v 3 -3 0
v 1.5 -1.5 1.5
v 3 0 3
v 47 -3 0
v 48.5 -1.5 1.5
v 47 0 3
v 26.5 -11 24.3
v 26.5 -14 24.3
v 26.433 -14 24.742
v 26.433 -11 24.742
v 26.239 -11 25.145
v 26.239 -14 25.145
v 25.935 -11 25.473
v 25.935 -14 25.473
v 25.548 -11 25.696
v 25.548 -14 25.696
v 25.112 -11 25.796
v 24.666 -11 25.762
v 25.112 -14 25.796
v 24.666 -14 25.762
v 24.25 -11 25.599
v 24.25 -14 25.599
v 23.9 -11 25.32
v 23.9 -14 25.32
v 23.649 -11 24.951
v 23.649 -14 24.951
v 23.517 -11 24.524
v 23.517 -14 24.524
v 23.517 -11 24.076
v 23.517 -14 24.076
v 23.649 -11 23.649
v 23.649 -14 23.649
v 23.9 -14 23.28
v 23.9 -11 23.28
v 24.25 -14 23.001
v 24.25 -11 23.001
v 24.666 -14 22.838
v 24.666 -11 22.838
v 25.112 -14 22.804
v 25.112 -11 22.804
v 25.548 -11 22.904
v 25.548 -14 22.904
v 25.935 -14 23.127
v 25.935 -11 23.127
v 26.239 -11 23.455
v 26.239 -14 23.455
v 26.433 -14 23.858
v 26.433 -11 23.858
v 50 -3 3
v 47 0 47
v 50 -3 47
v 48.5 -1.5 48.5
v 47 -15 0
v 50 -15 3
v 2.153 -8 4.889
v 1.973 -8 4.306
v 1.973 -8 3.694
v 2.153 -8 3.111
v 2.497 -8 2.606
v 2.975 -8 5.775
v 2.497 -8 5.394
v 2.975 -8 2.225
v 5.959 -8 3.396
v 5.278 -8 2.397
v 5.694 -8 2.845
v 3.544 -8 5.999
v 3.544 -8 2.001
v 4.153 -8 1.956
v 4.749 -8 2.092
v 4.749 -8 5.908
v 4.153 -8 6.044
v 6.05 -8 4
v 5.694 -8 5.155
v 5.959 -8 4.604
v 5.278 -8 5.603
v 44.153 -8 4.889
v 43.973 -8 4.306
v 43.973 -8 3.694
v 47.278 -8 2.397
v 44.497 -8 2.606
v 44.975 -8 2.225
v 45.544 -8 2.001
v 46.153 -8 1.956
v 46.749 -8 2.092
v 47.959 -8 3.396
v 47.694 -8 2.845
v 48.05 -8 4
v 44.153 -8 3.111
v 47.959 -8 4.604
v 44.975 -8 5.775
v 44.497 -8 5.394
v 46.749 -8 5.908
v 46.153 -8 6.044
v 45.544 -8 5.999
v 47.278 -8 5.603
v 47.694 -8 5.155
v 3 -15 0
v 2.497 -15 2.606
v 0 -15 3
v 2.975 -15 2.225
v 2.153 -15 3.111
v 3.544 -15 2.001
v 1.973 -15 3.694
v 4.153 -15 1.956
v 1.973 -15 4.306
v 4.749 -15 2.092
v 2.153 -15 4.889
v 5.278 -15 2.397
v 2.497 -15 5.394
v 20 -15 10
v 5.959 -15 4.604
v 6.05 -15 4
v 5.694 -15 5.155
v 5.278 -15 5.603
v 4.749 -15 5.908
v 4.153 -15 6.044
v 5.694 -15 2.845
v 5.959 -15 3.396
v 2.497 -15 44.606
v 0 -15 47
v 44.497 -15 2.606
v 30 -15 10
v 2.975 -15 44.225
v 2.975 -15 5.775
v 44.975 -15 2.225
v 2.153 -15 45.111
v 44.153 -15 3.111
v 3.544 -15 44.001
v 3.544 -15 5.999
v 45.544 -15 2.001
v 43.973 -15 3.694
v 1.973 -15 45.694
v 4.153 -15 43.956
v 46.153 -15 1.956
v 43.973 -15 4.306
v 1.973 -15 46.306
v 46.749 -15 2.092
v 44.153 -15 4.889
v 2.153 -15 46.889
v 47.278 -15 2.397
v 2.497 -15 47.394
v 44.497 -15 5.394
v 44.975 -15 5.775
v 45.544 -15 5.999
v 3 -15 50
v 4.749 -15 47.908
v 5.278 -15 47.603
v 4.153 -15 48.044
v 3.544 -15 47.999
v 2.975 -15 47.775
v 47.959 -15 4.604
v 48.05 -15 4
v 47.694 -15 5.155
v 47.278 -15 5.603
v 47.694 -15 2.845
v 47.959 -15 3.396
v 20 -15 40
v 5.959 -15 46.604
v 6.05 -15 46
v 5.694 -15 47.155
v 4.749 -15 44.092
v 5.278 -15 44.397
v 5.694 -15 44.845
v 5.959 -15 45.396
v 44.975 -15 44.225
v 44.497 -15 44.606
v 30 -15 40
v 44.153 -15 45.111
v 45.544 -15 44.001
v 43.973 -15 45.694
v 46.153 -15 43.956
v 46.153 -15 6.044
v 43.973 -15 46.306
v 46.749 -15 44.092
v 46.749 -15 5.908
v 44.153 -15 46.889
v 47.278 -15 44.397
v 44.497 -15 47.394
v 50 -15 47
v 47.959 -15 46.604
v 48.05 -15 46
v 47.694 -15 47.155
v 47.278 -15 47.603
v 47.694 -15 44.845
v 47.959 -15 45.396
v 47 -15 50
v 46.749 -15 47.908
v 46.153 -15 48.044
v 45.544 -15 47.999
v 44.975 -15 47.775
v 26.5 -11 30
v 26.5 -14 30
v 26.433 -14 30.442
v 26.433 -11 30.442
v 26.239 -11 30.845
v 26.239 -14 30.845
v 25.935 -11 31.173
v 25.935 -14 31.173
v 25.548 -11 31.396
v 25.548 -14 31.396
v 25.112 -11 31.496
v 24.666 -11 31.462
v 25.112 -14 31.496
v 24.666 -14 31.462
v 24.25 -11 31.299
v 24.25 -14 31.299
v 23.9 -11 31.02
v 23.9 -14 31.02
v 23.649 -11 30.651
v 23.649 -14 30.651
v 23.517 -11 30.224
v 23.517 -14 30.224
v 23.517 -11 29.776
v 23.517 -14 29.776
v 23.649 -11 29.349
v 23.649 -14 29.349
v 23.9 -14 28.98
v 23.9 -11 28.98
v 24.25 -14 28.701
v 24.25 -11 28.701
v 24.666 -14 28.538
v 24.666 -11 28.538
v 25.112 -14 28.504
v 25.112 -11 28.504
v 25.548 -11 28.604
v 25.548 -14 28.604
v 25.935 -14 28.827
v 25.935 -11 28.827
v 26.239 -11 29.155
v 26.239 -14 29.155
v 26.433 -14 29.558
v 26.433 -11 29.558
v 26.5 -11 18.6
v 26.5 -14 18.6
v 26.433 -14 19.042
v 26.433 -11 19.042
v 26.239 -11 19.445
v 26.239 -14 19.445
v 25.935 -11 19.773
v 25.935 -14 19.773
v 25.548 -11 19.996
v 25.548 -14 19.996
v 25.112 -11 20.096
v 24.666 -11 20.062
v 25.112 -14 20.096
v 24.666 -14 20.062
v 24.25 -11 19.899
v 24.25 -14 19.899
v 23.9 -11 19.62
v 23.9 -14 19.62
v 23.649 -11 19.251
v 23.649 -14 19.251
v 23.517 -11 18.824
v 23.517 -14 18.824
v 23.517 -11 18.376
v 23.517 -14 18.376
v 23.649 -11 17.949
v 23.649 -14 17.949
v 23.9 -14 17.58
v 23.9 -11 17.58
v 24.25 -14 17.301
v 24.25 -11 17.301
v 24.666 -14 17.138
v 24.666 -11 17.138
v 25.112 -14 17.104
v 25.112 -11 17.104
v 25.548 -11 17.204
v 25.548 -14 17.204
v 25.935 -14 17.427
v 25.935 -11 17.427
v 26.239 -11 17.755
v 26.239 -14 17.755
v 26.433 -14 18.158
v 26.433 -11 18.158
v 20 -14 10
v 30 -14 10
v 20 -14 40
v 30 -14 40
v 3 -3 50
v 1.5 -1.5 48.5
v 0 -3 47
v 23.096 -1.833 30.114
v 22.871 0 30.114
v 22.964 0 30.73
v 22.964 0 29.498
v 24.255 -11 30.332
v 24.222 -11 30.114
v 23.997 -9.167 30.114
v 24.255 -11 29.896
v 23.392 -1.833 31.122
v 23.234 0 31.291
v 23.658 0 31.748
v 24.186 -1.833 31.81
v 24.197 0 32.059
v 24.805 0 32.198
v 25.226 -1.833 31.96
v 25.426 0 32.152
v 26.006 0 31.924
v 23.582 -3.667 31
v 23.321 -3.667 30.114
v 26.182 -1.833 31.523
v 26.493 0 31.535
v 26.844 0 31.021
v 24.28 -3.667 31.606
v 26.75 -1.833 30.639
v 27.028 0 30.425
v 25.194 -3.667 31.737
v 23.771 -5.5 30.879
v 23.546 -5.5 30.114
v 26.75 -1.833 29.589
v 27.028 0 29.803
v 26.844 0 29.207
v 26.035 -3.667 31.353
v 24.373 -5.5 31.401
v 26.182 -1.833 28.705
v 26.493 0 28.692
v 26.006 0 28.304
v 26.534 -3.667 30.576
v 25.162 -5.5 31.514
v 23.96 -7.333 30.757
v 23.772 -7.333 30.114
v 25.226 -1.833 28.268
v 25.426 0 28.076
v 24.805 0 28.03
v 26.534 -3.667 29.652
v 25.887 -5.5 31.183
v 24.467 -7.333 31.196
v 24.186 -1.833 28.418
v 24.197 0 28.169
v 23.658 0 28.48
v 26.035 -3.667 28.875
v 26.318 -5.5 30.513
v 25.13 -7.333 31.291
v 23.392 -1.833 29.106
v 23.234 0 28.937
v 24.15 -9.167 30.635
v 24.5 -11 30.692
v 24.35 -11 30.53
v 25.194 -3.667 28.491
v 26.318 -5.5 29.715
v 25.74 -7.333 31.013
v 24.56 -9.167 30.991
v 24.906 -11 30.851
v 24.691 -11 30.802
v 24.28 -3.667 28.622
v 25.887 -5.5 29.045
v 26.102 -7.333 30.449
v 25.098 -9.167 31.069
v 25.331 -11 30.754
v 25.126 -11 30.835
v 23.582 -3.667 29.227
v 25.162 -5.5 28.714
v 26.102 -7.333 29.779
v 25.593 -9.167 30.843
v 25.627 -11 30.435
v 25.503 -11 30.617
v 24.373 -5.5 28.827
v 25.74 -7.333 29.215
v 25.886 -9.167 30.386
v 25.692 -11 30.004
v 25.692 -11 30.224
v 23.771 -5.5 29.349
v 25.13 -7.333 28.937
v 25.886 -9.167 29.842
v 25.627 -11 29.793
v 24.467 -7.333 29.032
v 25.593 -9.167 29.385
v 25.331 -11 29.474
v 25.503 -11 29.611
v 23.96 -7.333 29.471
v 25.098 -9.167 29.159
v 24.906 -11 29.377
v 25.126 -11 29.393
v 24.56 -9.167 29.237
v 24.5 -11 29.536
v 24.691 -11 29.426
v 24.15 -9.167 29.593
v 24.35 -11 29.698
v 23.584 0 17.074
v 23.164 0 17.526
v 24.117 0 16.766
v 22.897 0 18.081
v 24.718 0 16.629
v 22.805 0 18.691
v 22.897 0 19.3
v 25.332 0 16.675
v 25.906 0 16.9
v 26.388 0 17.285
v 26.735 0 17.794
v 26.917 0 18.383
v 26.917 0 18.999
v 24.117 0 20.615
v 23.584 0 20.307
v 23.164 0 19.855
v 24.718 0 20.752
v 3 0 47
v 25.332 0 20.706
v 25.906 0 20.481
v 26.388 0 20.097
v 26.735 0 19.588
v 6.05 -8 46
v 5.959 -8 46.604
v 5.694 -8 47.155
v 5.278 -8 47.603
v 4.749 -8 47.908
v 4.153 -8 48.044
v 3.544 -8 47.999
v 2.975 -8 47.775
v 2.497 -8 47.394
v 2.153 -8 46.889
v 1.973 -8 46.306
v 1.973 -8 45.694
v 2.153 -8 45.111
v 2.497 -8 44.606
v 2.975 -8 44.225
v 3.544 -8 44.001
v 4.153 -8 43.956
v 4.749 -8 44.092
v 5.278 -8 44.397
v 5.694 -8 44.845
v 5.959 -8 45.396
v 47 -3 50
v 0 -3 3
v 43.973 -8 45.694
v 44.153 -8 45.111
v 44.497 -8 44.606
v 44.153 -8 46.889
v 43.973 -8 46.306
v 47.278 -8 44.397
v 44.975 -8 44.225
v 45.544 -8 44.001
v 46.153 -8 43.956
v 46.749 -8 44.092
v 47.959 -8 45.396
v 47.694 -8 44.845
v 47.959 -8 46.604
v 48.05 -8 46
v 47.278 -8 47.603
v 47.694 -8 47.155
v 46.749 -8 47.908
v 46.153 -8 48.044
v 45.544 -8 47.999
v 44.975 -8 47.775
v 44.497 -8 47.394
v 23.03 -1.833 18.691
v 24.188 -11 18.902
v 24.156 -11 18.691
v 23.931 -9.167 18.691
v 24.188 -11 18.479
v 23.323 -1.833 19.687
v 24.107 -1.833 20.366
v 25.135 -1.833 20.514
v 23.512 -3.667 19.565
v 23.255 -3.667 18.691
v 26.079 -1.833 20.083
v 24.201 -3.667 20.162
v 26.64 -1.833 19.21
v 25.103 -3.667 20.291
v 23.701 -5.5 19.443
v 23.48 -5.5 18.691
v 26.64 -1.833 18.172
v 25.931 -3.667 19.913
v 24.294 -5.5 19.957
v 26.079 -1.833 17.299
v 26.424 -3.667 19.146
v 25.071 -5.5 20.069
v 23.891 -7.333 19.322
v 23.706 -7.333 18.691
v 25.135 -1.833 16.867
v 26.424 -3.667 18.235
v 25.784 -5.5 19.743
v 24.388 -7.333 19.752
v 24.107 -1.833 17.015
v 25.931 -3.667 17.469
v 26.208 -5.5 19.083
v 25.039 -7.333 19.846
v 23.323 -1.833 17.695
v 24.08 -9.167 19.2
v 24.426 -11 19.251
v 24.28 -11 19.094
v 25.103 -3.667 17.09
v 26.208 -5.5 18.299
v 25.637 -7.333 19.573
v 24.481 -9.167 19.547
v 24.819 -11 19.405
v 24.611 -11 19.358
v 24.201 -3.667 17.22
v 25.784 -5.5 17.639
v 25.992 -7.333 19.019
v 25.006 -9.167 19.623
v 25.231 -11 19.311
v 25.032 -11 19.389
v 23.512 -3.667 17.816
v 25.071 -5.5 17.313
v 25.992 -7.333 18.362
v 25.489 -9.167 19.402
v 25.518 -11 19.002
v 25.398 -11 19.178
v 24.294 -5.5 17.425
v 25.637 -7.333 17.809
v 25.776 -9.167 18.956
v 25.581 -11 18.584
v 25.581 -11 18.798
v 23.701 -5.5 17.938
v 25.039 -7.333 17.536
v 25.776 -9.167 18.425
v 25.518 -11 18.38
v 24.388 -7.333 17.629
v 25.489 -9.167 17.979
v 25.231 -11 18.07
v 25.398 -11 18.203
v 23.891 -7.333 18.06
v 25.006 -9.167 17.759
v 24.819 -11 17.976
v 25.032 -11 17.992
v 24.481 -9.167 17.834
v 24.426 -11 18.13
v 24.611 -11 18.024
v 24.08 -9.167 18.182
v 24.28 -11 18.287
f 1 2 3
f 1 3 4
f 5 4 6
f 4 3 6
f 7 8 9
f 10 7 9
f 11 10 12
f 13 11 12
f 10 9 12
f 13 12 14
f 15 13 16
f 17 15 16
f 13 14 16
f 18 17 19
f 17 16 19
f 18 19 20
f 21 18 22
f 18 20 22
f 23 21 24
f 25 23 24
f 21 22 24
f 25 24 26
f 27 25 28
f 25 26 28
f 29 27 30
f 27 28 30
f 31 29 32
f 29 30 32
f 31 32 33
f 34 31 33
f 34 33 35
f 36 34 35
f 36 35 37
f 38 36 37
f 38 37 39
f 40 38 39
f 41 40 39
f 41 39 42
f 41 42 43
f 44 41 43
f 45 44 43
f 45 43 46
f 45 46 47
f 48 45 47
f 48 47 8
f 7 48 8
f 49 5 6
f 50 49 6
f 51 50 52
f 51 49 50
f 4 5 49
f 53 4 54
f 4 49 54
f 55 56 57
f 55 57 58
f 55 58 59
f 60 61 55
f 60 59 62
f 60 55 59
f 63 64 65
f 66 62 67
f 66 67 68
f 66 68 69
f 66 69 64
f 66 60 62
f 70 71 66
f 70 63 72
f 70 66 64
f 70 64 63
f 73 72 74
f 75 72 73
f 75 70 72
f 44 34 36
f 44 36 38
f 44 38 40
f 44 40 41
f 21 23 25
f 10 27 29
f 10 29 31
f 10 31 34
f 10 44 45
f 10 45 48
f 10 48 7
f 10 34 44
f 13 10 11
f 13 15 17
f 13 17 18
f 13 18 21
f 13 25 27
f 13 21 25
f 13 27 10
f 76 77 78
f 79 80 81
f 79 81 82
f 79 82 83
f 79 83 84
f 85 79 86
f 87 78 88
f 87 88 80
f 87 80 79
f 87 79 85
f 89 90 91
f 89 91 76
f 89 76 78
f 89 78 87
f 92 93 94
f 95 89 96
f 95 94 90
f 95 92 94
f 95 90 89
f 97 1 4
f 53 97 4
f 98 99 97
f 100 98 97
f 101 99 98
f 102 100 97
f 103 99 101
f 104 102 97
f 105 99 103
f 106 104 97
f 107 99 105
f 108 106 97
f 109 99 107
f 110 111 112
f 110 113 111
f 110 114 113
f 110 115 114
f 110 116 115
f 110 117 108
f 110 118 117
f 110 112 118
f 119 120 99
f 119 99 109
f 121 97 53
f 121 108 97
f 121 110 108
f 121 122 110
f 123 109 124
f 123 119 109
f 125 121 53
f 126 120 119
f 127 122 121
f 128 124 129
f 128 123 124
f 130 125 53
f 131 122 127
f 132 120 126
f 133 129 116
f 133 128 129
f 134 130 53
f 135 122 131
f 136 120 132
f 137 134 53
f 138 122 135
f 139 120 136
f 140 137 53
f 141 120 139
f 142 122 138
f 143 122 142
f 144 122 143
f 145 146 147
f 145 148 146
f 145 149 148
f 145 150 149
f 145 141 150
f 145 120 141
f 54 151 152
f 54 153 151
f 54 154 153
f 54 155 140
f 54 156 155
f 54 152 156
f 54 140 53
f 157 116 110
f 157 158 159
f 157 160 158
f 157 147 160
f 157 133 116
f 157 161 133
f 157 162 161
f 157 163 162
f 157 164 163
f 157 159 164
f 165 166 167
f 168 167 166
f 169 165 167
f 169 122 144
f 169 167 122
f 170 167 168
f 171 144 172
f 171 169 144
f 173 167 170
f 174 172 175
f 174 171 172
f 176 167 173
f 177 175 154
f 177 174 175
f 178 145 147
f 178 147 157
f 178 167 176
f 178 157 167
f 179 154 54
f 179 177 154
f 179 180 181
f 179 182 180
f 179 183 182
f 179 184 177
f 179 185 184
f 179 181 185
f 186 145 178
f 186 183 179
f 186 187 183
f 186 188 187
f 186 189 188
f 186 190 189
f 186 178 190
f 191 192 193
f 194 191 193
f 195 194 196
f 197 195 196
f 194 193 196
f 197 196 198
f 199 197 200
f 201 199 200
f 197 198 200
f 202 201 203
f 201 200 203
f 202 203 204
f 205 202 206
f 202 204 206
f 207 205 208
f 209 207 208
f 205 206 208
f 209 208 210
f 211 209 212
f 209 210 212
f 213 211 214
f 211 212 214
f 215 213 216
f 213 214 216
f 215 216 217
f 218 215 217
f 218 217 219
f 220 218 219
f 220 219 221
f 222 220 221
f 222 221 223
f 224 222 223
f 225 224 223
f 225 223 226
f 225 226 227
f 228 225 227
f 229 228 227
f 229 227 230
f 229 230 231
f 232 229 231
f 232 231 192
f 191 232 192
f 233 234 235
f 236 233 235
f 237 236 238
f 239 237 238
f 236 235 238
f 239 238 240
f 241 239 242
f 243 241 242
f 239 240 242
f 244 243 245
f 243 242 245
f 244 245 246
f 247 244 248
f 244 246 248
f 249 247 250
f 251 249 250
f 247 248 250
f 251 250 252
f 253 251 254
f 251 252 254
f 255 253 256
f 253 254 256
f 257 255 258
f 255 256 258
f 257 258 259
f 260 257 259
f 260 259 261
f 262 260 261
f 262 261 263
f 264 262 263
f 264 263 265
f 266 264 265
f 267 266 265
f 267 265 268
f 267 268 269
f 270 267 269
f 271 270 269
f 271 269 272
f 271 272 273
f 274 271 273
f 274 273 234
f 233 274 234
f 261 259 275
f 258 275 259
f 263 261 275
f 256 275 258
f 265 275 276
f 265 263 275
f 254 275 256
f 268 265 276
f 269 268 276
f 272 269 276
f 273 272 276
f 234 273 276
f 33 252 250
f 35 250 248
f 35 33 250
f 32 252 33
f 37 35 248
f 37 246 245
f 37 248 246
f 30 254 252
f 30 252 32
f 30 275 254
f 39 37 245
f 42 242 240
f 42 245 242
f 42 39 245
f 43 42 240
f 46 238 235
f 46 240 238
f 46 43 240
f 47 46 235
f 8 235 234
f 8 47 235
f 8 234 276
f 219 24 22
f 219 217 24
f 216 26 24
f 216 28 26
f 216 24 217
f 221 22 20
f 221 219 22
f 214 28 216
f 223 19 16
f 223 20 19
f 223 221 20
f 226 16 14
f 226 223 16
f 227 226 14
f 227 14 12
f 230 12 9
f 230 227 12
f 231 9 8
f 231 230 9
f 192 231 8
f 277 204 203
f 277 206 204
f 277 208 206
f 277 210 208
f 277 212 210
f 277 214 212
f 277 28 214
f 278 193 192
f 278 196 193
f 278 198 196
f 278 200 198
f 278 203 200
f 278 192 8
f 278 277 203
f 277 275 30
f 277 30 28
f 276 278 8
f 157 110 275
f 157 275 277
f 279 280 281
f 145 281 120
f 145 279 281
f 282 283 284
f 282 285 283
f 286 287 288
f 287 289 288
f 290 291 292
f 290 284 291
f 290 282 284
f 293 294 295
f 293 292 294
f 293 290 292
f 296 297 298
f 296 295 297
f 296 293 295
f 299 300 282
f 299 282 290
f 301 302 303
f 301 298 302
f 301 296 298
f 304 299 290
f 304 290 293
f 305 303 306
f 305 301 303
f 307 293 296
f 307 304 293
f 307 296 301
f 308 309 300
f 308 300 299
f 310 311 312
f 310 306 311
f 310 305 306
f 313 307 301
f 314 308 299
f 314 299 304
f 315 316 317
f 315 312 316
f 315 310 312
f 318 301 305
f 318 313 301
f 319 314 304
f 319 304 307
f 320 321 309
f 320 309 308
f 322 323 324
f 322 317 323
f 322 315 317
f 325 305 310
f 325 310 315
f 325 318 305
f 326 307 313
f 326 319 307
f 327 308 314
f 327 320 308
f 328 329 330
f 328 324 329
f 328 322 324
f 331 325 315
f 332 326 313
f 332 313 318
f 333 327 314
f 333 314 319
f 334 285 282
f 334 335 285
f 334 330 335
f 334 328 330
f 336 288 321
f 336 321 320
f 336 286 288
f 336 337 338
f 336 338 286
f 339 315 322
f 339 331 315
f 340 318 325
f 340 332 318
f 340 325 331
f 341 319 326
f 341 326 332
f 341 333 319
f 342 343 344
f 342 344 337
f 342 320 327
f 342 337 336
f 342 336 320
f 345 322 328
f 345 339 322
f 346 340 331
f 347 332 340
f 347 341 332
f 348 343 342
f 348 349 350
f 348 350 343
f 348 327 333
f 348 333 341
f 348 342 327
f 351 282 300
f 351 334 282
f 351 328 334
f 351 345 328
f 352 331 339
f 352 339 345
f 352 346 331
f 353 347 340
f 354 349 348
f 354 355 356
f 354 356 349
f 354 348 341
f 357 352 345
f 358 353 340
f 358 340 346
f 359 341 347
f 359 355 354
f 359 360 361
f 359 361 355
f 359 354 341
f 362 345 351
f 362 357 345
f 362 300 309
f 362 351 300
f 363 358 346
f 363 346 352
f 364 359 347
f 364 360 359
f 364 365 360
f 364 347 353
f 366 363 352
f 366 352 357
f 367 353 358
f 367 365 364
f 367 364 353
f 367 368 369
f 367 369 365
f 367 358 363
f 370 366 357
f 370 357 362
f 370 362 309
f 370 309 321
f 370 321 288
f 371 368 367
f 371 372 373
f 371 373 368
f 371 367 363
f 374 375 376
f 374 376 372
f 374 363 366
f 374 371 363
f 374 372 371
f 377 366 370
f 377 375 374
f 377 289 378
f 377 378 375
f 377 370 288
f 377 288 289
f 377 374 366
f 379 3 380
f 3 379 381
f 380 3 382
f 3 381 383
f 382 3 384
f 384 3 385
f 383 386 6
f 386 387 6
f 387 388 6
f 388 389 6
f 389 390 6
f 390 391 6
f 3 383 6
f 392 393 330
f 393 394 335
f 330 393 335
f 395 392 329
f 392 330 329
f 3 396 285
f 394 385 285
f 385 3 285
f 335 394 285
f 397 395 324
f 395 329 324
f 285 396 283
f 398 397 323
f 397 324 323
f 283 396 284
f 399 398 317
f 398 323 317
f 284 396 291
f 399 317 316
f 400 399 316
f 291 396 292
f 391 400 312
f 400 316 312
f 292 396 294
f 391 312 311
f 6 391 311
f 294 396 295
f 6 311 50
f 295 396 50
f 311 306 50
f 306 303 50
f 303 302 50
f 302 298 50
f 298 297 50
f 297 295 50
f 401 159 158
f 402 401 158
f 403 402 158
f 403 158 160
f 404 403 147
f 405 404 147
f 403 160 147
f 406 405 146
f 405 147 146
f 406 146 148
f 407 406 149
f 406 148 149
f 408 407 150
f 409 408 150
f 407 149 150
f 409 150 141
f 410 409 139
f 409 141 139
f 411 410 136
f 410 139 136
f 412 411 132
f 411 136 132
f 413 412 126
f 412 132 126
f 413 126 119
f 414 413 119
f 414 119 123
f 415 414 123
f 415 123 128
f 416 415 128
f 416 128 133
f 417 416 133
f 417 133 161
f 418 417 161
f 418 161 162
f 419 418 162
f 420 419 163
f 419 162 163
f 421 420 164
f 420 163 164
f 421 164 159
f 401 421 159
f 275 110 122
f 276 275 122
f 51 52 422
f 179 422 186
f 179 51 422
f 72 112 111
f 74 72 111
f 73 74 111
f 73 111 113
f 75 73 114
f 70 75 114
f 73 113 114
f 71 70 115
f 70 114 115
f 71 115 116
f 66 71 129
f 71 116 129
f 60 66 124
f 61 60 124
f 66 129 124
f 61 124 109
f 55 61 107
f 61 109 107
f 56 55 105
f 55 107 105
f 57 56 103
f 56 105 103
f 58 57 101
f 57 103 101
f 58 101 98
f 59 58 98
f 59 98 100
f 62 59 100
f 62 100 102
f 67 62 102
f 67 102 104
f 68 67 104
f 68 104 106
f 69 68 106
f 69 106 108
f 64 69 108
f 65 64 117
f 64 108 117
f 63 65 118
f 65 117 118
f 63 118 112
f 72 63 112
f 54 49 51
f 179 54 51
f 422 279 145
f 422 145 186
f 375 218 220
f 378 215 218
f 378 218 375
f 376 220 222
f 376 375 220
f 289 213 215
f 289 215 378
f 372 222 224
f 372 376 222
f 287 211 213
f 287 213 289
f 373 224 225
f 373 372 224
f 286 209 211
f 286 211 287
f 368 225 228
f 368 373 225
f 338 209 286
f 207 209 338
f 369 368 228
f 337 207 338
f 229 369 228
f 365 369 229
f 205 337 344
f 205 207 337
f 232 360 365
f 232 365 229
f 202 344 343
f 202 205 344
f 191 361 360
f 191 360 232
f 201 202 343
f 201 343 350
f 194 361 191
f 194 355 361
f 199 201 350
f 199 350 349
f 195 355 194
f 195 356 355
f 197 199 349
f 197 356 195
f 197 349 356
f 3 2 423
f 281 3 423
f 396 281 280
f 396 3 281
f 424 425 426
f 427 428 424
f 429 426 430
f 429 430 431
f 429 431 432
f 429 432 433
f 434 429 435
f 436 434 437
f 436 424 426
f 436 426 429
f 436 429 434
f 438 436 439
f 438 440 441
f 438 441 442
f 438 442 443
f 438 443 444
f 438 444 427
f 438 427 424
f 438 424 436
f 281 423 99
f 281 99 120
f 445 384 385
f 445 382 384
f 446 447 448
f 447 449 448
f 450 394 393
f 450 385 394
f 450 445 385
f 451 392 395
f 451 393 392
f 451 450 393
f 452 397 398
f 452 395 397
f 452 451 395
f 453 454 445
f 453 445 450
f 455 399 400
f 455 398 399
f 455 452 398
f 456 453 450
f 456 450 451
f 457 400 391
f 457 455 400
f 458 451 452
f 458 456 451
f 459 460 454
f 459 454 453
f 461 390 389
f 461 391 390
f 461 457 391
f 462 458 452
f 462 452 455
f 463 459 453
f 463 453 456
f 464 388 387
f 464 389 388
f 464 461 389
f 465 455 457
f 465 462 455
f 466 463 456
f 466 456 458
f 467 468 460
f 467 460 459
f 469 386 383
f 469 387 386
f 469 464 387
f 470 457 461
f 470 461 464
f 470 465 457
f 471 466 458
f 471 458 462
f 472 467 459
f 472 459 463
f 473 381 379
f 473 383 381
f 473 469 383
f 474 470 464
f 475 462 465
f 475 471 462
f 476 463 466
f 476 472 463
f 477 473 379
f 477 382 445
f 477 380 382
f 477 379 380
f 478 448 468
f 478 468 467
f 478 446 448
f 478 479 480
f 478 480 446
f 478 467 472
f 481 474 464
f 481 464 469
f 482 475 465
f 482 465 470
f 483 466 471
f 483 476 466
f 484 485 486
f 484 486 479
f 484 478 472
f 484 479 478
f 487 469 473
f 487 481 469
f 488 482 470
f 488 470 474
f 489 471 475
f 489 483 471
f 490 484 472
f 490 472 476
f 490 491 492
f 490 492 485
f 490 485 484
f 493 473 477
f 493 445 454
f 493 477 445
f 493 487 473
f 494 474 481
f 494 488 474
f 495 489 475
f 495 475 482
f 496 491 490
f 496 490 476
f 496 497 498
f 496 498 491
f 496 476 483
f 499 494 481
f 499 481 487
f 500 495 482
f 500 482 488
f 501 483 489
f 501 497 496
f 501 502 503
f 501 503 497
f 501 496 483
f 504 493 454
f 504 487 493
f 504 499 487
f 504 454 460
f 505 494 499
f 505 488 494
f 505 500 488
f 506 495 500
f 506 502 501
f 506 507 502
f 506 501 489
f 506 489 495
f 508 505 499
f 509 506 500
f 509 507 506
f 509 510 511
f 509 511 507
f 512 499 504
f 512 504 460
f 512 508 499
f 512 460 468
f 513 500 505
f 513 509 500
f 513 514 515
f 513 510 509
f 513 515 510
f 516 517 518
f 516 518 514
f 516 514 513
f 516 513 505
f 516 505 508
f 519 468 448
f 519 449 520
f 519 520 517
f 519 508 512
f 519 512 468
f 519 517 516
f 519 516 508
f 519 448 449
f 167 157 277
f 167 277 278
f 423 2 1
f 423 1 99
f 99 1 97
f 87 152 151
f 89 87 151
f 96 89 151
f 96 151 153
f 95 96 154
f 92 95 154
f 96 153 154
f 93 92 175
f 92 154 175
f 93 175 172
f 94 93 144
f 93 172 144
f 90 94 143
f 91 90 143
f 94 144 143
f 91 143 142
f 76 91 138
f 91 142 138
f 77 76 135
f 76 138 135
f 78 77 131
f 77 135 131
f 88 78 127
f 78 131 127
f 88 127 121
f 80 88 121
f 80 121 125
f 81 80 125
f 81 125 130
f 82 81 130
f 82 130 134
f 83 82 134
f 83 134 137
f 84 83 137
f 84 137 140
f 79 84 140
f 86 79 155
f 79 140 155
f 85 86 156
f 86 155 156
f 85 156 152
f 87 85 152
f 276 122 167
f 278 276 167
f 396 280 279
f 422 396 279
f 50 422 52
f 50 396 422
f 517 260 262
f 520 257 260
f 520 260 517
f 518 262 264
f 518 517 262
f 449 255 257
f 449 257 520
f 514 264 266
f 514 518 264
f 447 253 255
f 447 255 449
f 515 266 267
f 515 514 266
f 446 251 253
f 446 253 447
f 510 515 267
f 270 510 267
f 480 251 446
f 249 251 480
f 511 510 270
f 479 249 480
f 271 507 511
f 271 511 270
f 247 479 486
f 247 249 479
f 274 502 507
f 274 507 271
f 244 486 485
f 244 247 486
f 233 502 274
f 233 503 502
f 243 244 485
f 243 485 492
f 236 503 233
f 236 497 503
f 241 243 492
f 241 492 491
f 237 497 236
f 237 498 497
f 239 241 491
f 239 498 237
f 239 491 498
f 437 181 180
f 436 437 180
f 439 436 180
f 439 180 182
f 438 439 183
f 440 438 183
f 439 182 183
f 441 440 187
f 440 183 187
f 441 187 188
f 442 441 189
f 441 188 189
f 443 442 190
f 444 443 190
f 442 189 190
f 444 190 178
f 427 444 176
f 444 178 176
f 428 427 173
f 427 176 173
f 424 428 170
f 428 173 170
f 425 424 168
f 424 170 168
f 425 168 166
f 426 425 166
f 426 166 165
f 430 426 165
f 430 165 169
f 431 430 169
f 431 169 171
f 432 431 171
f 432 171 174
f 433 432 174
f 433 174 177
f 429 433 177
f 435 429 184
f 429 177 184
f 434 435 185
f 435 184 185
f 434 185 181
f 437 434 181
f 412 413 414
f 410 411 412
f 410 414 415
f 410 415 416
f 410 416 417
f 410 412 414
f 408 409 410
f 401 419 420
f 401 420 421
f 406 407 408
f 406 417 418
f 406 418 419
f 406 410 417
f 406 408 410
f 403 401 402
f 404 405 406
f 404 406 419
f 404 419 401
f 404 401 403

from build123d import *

# Parameters (mm, degrees)
F0_W      = 50
F0_H      = 50
F1_DEPTH  = 15
F2_W      = 10
F2_H      = 30
F3_DEPTH  = 1
F5_R      = 1.5
F6_DEPTH  = 4
F7_R      = 2.05
F8_DEPTH  = 7
F9_SIZE   = 3
F10_SIZE  = 3
F11_R     = 2.0899118634
F11_R_2   = 2.0672780913
F12_DEPTH = 12
F12_TAPER = 7


with BuildPart() as f1:
    # F0 (on Front) → F1 (new body)
    with BuildSketch(Plane.XZ):
        with Locations((25, 25)):
            Rectangle(F0_W, F0_H)
    extrude(amount=F1_DEPTH)

    # F2 (on face) → F3 (cut)
    with BuildSketch(Plane.XZ.offset(15)):
        with Locations((25, 25)):
            Rectangle(F2_W, F2_H)
    extrude(amount=-F3_DEPTH, mode=Mode.SUBTRACT)

    # F5 (on face) → F6 (cut)
    with BuildSketch(Plane.XZ.offset(15)):
        with Locations((25, 30)):
            Circle(F5_R)
        with Locations((25, 24.3)):
            Circle(F5_R)
        with Locations((25, 18.6)):
            Circle(F5_R)
    extrude(amount=-F6_DEPTH, mode=Mode.SUBTRACT)

    # F7 (on face) → F8 (cut)
    with BuildSketch(Plane.XZ.offset(15)):
        with Locations((46, 46)):
            Circle(F7_R)
        with Locations((46, 4)):
            Circle(F7_R)
        with Locations((4, 4)):
            Circle(F7_R)
        with Locations((4, 46)):
            Circle(F7_R)
    extrude(amount=-F8_DEPTH, mode=Mode.SUBTRACT)

    # F9
    f9_edges = [f1.edges().sort_by_distance(p)[0] for p in [
        (0, 0, 25),
        (25, 0, 0),
        (50, 0, 25),
        (25, 0, 50),
    ]]
    chamfer(f9_edges, length=F9_SIZE)

    # F10
    f10_edges = [f1.edges().sort_by_distance(p)[0] for p in [
        (0, -9, 50),
        (50, -9, 50),
        (50, -9, 0),
        (0, -9, 0),
    ]]
    chamfer(f10_edges, length=F10_SIZE)

    # F11 (on face) → F12 (cut)
    with BuildSketch(Plane(origin=(0, 0, 0), x_dir=(-1, 0, 0), z_dir=(0, 1, 0))):
        with Locations((-24.9610114843, 30.1139894873)):
            Circle(F11_R)
        with Locations((-24.8724594712, 18.6907239258)):
            Circle(F11_R_2)
    extrude(amount=-F12_DEPTH, taper=F12_TAPER, mode=Mode.SUBTRACT)


solid = f1.part
